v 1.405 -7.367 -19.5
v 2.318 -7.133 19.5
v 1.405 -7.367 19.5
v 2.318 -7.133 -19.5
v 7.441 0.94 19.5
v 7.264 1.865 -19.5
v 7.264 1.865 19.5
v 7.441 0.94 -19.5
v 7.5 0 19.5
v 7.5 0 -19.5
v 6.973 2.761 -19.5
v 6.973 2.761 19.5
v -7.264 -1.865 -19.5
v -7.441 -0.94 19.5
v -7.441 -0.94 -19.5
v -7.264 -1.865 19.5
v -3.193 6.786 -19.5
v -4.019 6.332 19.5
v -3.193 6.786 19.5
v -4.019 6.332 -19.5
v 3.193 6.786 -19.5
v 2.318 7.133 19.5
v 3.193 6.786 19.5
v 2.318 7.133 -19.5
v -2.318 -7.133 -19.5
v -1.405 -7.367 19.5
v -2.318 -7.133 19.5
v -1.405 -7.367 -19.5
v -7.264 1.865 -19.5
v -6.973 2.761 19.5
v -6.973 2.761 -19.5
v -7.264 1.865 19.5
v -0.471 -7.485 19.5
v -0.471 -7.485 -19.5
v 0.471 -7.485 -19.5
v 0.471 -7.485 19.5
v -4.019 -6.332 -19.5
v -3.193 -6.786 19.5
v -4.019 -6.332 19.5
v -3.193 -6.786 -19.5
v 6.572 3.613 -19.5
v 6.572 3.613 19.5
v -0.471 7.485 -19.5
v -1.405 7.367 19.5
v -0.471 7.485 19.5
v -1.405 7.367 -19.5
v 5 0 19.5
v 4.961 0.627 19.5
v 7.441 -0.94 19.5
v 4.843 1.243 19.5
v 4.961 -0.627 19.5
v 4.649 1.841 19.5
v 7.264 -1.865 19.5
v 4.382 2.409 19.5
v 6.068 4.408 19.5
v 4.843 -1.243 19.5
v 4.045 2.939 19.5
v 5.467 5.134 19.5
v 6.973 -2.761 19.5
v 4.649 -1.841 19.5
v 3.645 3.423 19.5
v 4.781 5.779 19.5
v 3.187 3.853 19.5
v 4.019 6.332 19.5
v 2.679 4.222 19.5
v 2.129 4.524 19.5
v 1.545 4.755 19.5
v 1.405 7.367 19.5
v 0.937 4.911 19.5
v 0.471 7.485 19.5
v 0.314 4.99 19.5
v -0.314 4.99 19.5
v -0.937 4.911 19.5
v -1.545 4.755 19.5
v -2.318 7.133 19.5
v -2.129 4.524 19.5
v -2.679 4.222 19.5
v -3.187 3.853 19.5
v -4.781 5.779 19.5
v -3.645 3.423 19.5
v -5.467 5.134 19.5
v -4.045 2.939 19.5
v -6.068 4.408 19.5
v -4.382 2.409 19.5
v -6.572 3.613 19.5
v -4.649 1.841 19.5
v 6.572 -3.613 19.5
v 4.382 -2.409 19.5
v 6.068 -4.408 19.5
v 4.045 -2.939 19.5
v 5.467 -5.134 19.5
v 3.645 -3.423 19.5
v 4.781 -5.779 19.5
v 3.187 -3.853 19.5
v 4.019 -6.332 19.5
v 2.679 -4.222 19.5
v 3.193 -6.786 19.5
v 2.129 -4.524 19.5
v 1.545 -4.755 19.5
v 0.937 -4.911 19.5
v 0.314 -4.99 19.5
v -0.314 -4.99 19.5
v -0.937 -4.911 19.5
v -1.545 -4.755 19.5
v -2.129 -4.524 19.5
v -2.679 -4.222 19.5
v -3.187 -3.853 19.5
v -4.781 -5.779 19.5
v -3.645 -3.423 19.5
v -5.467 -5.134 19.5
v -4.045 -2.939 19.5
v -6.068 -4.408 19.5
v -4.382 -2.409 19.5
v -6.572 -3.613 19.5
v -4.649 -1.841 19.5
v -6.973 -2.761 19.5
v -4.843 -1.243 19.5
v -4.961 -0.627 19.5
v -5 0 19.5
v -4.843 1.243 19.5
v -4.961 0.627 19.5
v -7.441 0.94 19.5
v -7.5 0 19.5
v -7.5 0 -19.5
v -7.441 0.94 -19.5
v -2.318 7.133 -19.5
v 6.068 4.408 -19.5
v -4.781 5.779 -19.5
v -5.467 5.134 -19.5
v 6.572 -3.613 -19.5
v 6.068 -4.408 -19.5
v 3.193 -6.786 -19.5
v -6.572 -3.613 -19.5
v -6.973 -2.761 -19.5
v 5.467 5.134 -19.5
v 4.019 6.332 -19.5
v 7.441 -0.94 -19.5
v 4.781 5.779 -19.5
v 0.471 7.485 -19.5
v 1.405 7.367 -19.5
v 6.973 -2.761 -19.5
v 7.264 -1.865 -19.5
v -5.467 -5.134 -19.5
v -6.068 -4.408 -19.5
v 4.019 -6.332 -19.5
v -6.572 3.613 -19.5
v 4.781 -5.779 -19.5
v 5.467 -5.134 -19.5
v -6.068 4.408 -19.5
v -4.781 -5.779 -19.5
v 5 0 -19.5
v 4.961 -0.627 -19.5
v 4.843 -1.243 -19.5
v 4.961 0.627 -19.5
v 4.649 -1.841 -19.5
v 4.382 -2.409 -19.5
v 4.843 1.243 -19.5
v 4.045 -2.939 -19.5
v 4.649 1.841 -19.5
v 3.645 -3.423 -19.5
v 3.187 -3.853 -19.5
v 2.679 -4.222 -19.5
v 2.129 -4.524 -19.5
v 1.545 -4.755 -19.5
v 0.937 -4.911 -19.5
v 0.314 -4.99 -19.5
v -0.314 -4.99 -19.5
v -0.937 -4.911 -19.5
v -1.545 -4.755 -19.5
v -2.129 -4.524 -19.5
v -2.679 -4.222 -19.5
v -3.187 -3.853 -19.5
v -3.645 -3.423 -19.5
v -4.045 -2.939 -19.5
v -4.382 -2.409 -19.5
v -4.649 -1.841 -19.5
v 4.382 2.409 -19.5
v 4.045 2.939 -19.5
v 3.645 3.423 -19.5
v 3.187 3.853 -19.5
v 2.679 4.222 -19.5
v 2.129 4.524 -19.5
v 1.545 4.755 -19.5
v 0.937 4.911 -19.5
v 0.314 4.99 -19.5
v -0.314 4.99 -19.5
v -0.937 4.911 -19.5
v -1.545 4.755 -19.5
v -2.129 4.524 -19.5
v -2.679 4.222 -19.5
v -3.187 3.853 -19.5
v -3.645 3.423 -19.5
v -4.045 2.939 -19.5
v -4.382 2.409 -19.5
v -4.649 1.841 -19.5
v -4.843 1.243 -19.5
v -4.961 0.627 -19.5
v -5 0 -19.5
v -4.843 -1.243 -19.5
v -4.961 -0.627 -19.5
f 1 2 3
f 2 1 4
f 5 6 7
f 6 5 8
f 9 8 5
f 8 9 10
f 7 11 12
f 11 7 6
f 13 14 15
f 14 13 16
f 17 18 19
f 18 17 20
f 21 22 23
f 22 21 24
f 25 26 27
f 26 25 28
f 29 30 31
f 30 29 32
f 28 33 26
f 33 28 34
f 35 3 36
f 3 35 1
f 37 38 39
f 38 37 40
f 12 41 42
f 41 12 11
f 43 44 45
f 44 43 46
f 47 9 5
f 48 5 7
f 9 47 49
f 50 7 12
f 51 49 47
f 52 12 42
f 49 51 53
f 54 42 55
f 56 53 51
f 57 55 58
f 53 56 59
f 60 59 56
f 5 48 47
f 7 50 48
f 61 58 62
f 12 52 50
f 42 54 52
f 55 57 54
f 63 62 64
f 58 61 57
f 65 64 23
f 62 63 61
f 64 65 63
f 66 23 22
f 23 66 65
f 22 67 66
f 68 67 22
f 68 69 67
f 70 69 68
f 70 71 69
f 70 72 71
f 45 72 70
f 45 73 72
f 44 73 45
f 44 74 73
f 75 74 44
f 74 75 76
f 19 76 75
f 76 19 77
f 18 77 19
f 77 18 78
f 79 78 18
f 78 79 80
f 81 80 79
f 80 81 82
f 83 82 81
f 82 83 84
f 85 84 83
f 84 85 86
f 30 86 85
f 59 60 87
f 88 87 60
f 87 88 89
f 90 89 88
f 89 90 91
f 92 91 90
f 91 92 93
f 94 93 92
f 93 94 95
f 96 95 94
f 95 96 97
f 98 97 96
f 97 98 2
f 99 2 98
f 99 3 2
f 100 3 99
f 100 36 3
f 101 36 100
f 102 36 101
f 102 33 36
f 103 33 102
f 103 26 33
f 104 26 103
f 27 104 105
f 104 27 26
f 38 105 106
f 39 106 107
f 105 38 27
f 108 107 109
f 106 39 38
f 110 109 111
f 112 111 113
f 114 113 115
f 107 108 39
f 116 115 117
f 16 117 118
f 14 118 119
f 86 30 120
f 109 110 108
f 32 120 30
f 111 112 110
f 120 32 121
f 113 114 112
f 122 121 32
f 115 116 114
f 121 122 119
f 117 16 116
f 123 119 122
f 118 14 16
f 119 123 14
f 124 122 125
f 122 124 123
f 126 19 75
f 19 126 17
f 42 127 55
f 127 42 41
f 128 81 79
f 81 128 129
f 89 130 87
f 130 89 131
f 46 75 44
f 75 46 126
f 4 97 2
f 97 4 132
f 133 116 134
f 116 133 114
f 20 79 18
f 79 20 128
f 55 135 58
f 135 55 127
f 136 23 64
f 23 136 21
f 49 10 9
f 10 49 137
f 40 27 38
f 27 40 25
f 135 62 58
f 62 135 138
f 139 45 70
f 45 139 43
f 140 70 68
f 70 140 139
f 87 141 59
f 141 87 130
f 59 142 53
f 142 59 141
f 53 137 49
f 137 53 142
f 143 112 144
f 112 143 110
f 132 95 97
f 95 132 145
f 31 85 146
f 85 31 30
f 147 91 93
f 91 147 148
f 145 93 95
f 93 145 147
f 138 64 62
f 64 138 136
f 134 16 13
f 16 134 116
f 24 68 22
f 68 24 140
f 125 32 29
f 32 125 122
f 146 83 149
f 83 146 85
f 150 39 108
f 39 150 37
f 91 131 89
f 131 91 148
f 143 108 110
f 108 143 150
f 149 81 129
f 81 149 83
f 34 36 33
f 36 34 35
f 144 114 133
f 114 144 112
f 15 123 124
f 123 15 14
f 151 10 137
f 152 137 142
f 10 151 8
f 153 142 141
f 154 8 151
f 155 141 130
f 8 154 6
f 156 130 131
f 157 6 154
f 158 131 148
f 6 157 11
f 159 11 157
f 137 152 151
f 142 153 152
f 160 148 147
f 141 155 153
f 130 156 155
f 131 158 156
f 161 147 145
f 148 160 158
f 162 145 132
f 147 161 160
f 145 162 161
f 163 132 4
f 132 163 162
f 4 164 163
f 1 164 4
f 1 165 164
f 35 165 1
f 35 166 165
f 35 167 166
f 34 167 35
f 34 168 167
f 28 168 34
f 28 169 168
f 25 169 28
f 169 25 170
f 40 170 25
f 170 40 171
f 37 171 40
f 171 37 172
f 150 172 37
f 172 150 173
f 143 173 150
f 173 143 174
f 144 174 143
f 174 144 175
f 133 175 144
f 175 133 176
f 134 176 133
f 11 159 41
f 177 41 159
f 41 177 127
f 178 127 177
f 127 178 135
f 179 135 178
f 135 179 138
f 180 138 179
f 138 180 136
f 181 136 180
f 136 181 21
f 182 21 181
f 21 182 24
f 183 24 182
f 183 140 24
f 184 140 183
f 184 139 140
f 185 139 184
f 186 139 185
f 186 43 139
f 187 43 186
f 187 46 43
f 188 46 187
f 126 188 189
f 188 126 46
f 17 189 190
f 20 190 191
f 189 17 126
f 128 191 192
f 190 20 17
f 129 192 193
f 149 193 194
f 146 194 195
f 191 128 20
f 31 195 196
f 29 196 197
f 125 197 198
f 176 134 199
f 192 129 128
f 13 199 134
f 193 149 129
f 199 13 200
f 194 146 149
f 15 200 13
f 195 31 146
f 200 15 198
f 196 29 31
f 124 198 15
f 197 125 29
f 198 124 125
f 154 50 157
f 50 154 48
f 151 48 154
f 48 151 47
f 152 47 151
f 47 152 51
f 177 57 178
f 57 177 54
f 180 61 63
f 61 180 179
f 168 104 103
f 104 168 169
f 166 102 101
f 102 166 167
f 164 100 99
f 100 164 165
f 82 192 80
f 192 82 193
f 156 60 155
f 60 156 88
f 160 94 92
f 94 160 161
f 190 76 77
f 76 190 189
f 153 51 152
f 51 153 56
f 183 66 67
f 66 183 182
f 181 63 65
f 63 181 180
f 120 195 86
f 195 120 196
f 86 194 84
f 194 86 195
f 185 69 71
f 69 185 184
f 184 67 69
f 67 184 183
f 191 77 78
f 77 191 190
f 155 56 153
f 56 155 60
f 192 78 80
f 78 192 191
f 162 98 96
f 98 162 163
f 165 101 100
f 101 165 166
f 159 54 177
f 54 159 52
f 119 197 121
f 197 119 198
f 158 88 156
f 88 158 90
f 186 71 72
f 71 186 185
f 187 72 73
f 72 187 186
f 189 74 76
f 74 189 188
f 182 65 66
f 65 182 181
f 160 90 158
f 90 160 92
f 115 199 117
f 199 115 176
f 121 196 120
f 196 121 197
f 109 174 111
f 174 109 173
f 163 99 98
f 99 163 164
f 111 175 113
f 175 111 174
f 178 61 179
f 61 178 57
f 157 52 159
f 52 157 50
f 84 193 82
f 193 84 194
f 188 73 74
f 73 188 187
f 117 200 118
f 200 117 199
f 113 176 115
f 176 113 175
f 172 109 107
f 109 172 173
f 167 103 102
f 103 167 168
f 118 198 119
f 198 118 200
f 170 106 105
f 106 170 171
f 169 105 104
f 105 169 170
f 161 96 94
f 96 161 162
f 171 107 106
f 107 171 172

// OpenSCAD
$fn = 50;


difference() {
	union() {
		translate(v = [0, 0, -19.5000000000]) {
			cylinder(h = 39, r = 7.5000000000);
		}
	}
	union() {
		translate(v = [0, 0, -100.0000000000]) {
			cylinder(h = 200, r = 5.0000000000);
		}
	}
}
